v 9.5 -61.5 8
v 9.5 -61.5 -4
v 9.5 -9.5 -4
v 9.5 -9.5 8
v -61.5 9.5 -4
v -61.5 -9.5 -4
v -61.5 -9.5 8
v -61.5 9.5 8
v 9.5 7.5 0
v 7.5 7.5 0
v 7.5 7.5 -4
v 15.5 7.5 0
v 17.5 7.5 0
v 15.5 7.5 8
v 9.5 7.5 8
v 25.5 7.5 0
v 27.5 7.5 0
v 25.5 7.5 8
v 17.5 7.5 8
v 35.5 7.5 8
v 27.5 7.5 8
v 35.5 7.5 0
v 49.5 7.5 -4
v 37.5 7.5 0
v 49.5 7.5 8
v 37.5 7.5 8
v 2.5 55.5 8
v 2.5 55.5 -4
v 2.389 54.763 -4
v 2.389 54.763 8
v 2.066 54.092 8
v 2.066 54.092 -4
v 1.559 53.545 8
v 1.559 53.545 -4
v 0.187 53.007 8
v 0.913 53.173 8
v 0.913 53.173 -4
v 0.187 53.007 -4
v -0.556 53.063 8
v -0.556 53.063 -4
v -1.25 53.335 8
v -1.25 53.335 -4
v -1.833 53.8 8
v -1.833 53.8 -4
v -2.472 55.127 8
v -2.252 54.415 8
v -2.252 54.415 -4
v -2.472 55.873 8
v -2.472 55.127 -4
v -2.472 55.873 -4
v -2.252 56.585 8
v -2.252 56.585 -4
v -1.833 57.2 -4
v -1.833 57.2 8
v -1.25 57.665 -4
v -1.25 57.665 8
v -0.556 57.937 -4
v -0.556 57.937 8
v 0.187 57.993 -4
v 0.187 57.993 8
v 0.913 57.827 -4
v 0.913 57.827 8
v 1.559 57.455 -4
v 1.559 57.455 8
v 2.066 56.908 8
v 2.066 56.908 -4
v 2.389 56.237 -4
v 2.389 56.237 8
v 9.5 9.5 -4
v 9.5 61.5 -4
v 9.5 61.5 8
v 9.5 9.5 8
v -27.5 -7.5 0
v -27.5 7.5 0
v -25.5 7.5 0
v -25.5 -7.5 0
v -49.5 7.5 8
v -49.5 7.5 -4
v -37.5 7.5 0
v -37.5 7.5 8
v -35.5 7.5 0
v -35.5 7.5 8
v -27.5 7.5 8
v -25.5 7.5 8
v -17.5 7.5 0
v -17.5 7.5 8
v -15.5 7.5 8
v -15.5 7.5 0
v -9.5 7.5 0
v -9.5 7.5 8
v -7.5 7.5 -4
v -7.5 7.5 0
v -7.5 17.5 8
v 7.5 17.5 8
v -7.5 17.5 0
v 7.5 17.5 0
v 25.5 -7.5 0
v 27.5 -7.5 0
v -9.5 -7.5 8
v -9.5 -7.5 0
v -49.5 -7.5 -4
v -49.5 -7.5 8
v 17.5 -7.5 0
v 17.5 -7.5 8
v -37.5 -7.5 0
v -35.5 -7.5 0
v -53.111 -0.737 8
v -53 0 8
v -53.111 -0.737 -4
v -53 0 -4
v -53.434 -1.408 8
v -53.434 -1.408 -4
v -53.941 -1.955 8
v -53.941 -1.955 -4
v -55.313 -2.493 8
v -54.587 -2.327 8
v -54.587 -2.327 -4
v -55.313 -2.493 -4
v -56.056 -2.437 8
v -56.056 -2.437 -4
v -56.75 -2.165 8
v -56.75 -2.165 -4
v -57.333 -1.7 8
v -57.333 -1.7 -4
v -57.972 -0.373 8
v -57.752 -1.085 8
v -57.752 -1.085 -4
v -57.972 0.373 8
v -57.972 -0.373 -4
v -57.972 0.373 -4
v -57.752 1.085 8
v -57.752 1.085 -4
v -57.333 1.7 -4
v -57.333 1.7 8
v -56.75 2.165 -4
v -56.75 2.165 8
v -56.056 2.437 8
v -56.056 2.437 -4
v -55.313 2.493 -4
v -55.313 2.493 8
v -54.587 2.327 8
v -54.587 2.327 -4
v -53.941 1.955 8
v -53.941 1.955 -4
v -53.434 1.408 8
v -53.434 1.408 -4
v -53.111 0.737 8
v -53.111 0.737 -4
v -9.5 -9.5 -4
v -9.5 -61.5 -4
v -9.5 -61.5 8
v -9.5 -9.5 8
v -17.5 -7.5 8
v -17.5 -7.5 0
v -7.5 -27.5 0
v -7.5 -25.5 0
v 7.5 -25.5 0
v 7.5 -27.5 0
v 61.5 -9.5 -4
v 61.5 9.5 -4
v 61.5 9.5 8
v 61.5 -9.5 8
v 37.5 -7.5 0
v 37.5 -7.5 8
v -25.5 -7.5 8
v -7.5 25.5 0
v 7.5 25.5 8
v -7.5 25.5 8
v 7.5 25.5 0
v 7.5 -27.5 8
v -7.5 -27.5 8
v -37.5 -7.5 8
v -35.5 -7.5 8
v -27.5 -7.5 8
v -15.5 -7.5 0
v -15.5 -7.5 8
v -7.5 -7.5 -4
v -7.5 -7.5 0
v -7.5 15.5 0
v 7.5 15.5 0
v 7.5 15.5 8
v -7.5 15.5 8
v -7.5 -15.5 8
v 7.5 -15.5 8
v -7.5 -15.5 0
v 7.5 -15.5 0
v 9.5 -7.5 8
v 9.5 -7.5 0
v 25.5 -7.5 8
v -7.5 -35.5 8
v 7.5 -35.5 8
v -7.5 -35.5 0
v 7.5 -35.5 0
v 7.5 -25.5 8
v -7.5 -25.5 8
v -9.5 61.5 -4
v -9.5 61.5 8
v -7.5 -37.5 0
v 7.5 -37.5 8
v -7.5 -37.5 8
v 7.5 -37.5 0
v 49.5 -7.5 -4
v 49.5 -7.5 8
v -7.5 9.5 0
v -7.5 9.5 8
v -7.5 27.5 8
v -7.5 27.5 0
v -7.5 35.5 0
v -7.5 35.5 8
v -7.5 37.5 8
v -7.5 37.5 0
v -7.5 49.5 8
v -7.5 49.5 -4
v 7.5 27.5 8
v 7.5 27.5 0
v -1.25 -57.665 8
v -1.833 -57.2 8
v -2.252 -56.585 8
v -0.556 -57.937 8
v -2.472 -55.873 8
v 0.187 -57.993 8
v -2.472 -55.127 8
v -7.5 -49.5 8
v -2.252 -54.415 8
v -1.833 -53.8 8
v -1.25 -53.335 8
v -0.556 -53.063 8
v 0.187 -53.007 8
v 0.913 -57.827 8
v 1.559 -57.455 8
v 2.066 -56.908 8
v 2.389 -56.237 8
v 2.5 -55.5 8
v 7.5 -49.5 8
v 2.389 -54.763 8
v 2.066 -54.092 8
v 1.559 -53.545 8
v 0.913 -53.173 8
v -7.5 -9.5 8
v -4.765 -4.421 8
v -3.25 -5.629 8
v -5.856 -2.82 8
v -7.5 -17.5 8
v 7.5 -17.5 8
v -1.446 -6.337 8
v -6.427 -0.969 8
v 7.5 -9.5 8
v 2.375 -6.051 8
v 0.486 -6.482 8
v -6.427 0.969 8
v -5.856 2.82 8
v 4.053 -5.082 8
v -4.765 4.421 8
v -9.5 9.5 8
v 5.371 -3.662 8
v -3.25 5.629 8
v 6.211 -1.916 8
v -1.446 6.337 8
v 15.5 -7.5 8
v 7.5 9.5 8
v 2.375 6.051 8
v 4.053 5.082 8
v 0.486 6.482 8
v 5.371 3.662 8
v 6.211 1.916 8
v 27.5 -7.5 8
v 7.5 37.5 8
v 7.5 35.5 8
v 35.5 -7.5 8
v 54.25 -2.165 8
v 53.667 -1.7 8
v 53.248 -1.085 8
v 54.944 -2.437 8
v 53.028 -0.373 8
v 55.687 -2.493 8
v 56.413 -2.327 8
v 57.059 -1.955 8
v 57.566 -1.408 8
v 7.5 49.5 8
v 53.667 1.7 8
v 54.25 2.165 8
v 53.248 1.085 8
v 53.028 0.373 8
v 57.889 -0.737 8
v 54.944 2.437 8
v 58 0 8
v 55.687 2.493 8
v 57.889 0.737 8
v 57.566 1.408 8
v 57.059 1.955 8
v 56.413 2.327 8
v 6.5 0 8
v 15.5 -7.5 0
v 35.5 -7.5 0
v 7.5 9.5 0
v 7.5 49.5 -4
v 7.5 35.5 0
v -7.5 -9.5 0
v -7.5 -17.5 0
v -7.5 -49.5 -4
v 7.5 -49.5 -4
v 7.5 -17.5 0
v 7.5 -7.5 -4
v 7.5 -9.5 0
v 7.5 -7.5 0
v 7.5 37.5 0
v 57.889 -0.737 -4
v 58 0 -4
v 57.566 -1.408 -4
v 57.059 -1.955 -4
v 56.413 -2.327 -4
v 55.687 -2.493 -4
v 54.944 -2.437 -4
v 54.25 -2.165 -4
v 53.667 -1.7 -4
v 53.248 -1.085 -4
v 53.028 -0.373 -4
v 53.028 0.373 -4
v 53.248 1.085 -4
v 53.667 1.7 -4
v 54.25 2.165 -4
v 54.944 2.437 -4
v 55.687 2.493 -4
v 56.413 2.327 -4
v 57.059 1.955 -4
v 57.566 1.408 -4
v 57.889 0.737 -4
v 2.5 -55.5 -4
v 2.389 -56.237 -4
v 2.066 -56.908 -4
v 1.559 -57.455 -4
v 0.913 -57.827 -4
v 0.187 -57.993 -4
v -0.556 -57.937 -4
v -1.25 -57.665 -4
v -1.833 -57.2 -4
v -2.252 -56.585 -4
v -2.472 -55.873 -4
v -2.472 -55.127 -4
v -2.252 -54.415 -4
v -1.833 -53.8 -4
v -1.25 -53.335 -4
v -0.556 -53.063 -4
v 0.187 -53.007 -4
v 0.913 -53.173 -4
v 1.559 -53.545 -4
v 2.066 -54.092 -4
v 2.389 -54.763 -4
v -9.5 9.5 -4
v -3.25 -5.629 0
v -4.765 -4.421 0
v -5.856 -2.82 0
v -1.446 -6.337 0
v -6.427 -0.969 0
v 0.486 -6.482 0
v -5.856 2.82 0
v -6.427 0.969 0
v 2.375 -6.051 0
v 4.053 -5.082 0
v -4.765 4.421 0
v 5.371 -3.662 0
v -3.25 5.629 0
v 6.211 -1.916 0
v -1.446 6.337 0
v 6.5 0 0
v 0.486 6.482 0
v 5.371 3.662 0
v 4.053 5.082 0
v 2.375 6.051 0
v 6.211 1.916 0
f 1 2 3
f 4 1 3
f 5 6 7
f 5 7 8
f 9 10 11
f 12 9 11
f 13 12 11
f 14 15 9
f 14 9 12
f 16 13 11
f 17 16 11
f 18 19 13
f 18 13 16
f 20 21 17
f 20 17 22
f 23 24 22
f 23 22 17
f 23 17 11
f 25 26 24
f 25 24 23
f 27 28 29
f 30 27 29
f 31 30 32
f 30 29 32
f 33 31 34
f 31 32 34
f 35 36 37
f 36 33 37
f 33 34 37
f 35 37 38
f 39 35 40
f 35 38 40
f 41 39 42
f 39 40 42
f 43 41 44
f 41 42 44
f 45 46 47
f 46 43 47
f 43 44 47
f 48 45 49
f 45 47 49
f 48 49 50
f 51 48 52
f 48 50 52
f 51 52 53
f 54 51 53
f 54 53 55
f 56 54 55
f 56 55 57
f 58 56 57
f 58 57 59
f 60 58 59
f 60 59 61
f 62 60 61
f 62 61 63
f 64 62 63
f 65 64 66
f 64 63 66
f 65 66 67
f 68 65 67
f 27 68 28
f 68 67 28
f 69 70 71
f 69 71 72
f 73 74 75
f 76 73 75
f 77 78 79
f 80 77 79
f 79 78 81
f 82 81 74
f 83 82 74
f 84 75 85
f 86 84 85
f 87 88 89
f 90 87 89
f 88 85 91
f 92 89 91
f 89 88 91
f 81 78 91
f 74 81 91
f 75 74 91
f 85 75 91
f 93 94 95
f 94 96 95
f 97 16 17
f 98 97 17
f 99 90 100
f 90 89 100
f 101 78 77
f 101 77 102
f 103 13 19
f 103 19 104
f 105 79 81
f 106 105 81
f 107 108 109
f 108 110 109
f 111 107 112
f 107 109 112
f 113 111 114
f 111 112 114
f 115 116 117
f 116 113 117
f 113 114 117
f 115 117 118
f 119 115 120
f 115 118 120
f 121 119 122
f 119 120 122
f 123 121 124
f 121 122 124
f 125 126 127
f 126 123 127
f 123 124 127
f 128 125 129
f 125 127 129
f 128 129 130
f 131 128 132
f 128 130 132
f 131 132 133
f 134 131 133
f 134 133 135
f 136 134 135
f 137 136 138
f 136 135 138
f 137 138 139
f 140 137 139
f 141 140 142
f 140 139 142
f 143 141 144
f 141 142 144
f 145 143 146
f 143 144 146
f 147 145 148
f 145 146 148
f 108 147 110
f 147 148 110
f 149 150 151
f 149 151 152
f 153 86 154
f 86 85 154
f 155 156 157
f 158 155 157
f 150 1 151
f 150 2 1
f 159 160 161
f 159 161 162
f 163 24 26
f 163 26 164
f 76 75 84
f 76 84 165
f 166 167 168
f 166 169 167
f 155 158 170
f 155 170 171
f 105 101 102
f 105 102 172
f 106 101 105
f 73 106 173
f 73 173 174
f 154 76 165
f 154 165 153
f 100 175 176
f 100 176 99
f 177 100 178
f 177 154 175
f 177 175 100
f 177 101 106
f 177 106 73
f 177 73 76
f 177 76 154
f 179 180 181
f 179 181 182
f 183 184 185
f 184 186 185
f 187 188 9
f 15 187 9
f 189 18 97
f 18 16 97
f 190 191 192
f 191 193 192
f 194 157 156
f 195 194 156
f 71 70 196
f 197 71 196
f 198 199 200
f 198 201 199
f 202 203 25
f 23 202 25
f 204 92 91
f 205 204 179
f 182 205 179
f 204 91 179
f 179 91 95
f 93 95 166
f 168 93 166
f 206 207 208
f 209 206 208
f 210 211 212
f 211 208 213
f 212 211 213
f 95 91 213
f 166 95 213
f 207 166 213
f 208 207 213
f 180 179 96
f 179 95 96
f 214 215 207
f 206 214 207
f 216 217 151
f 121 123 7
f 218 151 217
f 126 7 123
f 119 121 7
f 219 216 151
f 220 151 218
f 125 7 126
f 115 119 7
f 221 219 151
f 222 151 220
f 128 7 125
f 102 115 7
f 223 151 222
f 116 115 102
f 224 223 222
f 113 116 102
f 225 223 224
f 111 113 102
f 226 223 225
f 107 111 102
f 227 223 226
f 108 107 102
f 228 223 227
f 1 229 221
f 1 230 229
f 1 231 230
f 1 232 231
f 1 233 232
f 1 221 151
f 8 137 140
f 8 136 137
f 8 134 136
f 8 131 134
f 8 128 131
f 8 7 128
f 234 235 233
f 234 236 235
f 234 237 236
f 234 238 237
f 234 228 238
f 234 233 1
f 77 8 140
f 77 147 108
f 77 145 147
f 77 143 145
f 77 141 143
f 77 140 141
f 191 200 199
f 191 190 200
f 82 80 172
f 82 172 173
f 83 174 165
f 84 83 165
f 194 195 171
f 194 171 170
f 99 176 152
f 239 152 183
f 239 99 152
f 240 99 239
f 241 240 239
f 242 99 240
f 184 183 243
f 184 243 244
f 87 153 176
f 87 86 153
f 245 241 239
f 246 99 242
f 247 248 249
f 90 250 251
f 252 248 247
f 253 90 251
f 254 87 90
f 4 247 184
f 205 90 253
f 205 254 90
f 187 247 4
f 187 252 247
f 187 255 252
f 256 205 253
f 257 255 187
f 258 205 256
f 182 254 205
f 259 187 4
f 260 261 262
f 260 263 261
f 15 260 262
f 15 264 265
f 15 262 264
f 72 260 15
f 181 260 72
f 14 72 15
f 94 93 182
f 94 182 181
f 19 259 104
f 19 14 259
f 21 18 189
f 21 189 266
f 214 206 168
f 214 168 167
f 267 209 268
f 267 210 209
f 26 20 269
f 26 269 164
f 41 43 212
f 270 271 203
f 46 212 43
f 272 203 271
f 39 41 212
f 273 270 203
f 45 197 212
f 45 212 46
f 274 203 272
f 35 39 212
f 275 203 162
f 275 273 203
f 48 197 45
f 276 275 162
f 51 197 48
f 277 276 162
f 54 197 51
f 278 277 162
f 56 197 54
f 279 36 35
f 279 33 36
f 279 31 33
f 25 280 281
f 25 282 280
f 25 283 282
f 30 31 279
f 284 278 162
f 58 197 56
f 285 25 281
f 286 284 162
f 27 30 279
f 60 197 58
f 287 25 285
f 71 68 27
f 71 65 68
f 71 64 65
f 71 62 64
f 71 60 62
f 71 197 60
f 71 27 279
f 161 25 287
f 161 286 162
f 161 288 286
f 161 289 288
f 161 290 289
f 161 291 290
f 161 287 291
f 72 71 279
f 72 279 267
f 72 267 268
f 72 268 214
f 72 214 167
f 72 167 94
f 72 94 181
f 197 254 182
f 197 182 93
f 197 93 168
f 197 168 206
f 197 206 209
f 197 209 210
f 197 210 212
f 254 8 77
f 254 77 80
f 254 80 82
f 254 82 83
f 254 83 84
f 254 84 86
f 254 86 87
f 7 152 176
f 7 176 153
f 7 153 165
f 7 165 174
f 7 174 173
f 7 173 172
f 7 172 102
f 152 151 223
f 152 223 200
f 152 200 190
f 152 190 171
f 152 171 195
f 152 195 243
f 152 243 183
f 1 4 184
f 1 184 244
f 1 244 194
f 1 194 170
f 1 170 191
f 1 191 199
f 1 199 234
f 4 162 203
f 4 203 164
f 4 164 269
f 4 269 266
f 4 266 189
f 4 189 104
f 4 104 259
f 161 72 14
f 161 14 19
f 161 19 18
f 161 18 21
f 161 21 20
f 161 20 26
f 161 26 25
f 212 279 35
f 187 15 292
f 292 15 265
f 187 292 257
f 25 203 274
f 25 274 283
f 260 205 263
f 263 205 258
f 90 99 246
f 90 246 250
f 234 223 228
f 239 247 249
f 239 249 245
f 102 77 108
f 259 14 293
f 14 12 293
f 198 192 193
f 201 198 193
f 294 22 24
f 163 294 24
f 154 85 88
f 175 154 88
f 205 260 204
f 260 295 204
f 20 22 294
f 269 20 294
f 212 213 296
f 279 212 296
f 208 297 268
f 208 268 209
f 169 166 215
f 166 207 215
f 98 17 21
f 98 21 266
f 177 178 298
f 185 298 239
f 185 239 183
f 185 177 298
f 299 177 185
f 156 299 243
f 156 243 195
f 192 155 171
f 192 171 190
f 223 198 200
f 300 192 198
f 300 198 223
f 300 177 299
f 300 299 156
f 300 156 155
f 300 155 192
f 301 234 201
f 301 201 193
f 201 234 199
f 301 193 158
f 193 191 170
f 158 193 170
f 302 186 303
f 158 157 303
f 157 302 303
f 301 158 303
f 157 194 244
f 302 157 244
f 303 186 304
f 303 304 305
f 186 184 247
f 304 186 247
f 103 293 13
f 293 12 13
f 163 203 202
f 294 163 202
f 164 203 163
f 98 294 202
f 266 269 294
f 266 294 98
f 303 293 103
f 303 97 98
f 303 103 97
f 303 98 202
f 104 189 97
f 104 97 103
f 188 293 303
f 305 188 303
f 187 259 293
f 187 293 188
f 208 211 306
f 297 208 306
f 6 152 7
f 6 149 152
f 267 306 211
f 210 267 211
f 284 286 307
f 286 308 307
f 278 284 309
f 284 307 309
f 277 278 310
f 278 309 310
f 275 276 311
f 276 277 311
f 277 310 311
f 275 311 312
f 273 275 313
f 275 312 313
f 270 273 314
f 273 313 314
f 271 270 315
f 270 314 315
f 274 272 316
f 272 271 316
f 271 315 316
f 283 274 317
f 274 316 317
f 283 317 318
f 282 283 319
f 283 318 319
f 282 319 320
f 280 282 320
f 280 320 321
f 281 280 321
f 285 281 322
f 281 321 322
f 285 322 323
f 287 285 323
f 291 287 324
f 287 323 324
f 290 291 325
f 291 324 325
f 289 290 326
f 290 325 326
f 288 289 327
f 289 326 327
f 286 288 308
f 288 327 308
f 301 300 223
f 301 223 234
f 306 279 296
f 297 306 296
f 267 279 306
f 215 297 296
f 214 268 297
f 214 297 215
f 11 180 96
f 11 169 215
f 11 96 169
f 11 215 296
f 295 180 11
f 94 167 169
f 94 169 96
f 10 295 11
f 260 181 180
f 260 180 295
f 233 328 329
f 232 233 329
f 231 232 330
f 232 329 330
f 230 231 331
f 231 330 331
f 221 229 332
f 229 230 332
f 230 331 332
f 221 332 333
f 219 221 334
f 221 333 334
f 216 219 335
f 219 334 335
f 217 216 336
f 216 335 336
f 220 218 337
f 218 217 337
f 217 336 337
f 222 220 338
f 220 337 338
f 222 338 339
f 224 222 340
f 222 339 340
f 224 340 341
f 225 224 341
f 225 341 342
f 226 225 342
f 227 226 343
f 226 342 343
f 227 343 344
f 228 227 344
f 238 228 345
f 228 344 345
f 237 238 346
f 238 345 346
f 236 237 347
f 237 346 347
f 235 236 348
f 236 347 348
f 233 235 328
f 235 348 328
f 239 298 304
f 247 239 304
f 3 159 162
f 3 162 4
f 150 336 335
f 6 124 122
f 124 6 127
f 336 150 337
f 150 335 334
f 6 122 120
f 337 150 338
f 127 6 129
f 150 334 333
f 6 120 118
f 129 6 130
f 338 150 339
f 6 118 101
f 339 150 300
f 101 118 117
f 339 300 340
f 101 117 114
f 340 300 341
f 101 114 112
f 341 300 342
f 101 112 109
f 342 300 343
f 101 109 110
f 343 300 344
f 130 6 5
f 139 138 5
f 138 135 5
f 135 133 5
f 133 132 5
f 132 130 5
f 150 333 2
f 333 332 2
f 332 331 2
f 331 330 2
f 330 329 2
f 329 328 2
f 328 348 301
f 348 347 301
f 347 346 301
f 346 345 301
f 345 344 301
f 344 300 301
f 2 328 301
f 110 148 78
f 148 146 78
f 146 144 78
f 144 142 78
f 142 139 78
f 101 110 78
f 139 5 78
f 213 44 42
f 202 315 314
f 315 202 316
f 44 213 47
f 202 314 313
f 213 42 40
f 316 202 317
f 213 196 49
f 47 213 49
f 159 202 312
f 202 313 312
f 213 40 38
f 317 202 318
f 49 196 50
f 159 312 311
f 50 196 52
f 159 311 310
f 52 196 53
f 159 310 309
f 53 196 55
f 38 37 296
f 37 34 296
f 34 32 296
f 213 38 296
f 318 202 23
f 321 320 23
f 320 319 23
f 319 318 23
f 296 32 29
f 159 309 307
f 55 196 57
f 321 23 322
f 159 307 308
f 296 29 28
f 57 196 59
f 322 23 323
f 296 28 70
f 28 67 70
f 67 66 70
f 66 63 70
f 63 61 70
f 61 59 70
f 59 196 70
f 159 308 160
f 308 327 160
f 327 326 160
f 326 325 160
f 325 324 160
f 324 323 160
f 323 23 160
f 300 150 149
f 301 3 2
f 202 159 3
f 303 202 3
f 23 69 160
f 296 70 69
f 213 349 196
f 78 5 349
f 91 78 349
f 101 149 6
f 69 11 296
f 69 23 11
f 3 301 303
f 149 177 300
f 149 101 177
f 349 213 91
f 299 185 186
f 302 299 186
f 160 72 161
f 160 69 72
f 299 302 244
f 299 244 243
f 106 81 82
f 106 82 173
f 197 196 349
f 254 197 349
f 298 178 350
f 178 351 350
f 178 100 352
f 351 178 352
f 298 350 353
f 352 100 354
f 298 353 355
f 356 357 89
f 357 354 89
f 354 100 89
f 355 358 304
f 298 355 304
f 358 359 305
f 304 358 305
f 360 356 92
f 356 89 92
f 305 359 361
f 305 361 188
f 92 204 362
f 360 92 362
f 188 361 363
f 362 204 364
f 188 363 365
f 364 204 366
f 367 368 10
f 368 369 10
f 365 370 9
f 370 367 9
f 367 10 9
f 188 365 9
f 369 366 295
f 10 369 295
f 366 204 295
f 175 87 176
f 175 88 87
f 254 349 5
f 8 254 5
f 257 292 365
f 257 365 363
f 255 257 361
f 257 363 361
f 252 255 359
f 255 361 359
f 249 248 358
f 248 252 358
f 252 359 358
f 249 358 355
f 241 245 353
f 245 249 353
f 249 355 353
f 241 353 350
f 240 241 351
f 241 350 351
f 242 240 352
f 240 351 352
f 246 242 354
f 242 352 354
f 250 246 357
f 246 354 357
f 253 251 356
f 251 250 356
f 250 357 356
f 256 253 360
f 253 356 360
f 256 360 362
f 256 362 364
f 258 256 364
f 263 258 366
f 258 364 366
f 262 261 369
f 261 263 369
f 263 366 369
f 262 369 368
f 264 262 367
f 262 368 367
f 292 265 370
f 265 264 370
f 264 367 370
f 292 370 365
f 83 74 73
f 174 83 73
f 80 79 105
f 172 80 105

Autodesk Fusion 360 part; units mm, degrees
sketch "Esboço1" plane through (0, 0, 0) normal (0, 0, 1) x (1, 0, 0)
  line L0 (9.5, 9.5) -> (-9.5, 9.5)
  line L1 (-9.5, 9.5) -> (-9.5, -9.5)
  line L2 (-9.5, -9.5) -> (9.5, -9.5)
  line L3 (9.5, -9.5) -> (9.5, 9.5)
  line L4 (9.5, 9.5) -> (-9.5, -9.5) construction
  line L5 (-9.5, 9.5) -> (9.5, -9.5) construction
  circle A0 centre (0, 0) radius 6.5
  line L6 (-9.5, 9.5) -> (-7.5, 9.5)
  line L7 (-7.5, 9.5) -> (-7.5, 7.5)
  line L8 (-7.5, 7.5) -> (-9.5, 7.5)
  line L9 (-9.5, 7.5) -> (-9.5, 9.5)
  line L10 (9.5, 9.5) -> (7.5, 9.5)
  line L11 (7.5, 9.5) -> (7.5, 7.5)
  line L12 (7.5, 7.5) -> (9.5, 7.5)
  line L13 (9.5, 7.5) -> (9.5, 9.5)
  line L14 (-9.5, -9.5) -> (-7.5, -9.5)
  line L15 (-7.5, -9.5) -> (-7.5, -7.5)
  line L16 (-7.5, -7.5) -> (-9.5, -7.5)
  line L17 (-9.5, -7.5) -> (-9.5, -9.5)
  line L18 (9.5, -9.5) -> (7.5, -9.5)
  line L19 (7.5, -9.5) -> (7.5, -7.5)
  line L20 (7.5, -7.5) -> (9.5, -7.5)
  line L21 (9.5, -7.5) -> (9.5, -9.5)
  line L22 (-9.5, 9.5) -> (-7.5, 9.5)
  line L23 (-7.5, 9.5) -> (-7.5, 49.5)
  line L24 (-7.5, 49.5) -> (-9.5, 49.5)
  line L25 (-9.5, 49.5) -> (-9.5, 9.5)
  line L26 (9.5, 9.5) -> (7.5, 9.5)
  line L27 (7.5, 9.5) -> (7.5, 49.5)
  line L28 (7.5, 49.5) -> (9.5, 49.5)
  line L29 (9.5, 49.5) -> (9.5, 9.5)
  line L30 (-9.5, 49.5) -> (9.5, 49.5)
  line L31 (9.5, 49.5) -> (9.5, 61.5)
  line L32 (9.5, 61.5) -> (-9.5, 61.5)
  line L33 (-9.5, 61.5) -> (-9.5, 49.5)
  line L34 (-9.5, 61.5) -> (9.5, 49.5) construction
  circle A1 centre (0, 55.5) radius 2.5
  line L35 (-7.5, 9.5) -> (7.5, 9.5)
  line L36 (7.5, 9.5) -> (7.5, 15.5)
  line L37 (7.5, 15.5) -> (-7.5, 15.5)
  line L38 (-7.5, 15.5) -> (-7.5, 9.5)
  line L39 (-7.5, 15.5) -> (7.5, 15.5)
  line L40 (7.5, 15.5) -> (7.5, 17.5)
  line L41 (7.5, 17.5) -> (-7.5, 17.5)
  line L42 (-7.5, 17.5) -> (-7.5, 15.5)
  line L43 (-7.5, 17.5) -> (7.5, 17.5)
  line L44 (7.5, 17.5) -> (7.5, 25.5)
  line L45 (7.5, 25.5) -> (-7.5, 25.5)
  line L46 (-7.5, 25.5) -> (-7.5, 17.5)
  line L47 (-7.5, 25.5) -> (7.5, 25.5)
  line L48 (7.5, 25.5) -> (7.5, 27.5)
  line L49 (7.5, 27.5) -> (-7.5, 27.5)
  line L50 (-7.5, 27.5) -> (-7.5, 25.5)
  line L51 (-7.5, 27.5) -> (7.5, 27.5)
  line L52 (7.5, 27.5) -> (7.5, 35.5)
  line L53 (7.5, 35.5) -> (-7.5, 35.5)
  line L54 (-7.5, 35.5) -> (-7.5, 27.5)
  line L55 (-7.5, 35.5) -> (7.5, 35.5)
  line L56 (7.5, 35.5) -> (7.5, 37.5)
  line L57 (7.5, 37.5) -> (-7.5, 37.5)
  line L58 (-7.5, 37.5) -> (-7.5, 35.5)
  line L59 (9.5, 9.5) -> (49.5, 9.5)
  line L60 (49.5, 9.5) -> (49.5, 7.5)
  line L61 (49.5, 7.5) -> (9.5, 7.5)
  line L62 (9.5, 7.5) -> (9.5, 9.5)
  line L63 (9.5, -9.5) -> (49.5, -9.5)
  line L64 (49.5, -9.5) -> (49.5, -7.5)
  line L65 (49.5, -7.5) -> (9.5, -7.5)
  line L66 (9.5, -7.5) -> (9.5, -9.5)
  line L67 (49.5, 9.5) -> (61.5, 9.5)
  line L68 (61.5, 9.5) -> (61.5, -9.5)
  line L69 (61.5, -9.5) -> (49.5, -9.5)
  line L70 (49.5, -9.5) -> (49.5, 9.5)
  line L71 (49.5, 9.5) -> (61.5, -9.5) construction
  circle A2 centre (55.5, 0) radius 2.5
  line L72 (9.5, 7.5) -> (15.5, 7.5)
  line L73 (15.5, 7.5) -> (15.5, -7.5)
  line L74 (15.5, -7.5) -> (9.5, -7.5)
  line L75 (9.5, -7.5) -> (9.5, 7.5)
  line L76 (15.5, 7.5) -> (17.5, 7.5)
  line L77 (17.5, 7.5) -> (17.5, -7.5)
  line L78 (17.5, -7.5) -> (15.5, -7.5)
  line L79 (15.5, -7.5) -> (15.5, 7.5)
  line L80 (17.5, 7.5) -> (25.5, 7.5)
  line L81 (25.5, 7.5) -> (25.5, -7.5)
  line L82 (25.5, -7.5) -> (17.5, -7.5)
  line L83 (17.5, -7.5) -> (17.5, 7.5)
  line L84 (25.5, 7.5) -> (27.5, 7.5)
  line L85 (27.5, 7.5) -> (27.5, -7.5)
  line L86 (27.5, -7.5) -> (25.5, -7.5)
  line L87 (25.5, -7.5) -> (25.5, 7.5)
  line L88 (27.5, 7.5) -> (35.5, 7.5)
  line L89 (35.5, 7.5) -> (35.5, -7.5)
  line L90 (35.5, -7.5) -> (27.5, -7.5)
  line L91 (27.5, -7.5) -> (27.5, 7.5)
  line L92 (35.5, 7.5) -> (37.5, 7.5)
  line L93 (37.5, 7.5) -> (37.5, -7.5)
  line L94 (37.5, -7.5) -> (35.5, -7.5)
  line L95 (35.5, -7.5) -> (35.5, 7.5)
  line L96 (-9.5, -9.5) -> (-7.5, -9.5)
  line L97 (-7.5, -9.5) -> (-7.5, -49.5)
  line L98 (-7.5, -49.5) -> (-9.5, -49.5)
  line L99 (-9.5, -49.5) -> (-9.5, -9.5)
  line L100 (9.5, -9.5) -> (7.5, -9.5)
  line L101 (7.5, -9.5) -> (7.5, -49.5)
  line L102 (7.5, -49.5) -> (9.5, -49.5)
  line L103 (9.5, -49.5) -> (9.5, -9.5)
  line L104 (-9.5, -49.5) -> (9.5, -49.5)
  line L105 (9.5, -49.5) -> (9.5, -61.5)
  line L106 (9.5, -61.5) -> (-9.5, -61.5)
  line L107 (-9.5, -61.5) -> (-9.5, -49.5)
  line L108 (-9.5, -49.5) -> (9.5, -61.5) construction
  circle A3 centre (0, -55.5) radius 2.5
  line L109 (-9.5, -9.5) -> (9.5, -9.5)
  line L110 (9.5, -9.5) -> (9.5, -15.5)
  line L111 (9.5, -15.5) -> (-9.5, -15.5)
  line L112 (-9.5, -15.5) -> (-9.5, -9.5)
  line L113 (-9.5, -15.5) -> (9.5, -15.5)
  line L114 (9.5, -15.5) -> (9.5, -17.5)
  line L115 (9.5, -17.5) -> (-9.5, -17.5)
  line L116 (-9.5, -17.5) -> (-9.5, -15.5)
  line L117 (-9.5, -17.5) -> (9.5, -17.5)
  line L118 (9.5, -17.5) -> (9.5, -25.5)
  line L119 (9.5, -25.5) -> (-9.5, -25.5)
  line L120 (-9.5, -25.5) -> (-9.5, -17.5)
  line L121 (-9.5, -25.5) -> (9.5, -25.5)
  line L122 (9.5, -25.5) -> (9.5, -27.5)
  line L123 (9.5, -27.5) -> (-9.5, -27.5)
  line L124 (-9.5, -27.5) -> (-9.5, -25.5)
  line L125 (-9.5, -27.5) -> (9.5, -27.5)
  line L126 (9.5, -27.5) -> (9.5, -35.5)
  line L127 (9.5, -35.5) -> (-9.5, -35.5)
  line L128 (-9.5, -35.5) -> (-9.5, -27.5)
  line L129 (-9.5, -35.5) -> (9.5, -35.5)
  line L130 (9.5, -35.5) -> (9.5, -37.5)
  line L131 (9.5, -37.5) -> (-9.5, -37.5)
  line L132 (-9.5, -37.5) -> (-9.5, -35.5)
  line L133 (-9.5, 9.5) -> (-49.5, 9.5)
  line L134 (-49.5, 9.5) -> (-49.5, 7.5)
  line L135 (-49.5, 7.5) -> (-9.5, 7.5)
  line L136 (-9.5, 7.5) -> (-9.5, 9.5)
  line L137 (-9.5, -9.5) -> (-49.5, -9.5)
  line L138 (-49.5, -9.5) -> (-49.5, -7.5)
  line L139 (-49.5, -7.5) -> (-9.5, -7.5)
  line L140 (-9.5, -7.5) -> (-9.5, -9.5)
  line L141 (-49.5, -9.5) -> (-61.5, -9.5)
  line L142 (-61.5, -9.5) -> (-61.5, 9.5)
  line L143 (-61.5, 9.5) -> (-49.5, 9.5)
  line L144 (-49.5, 9.5) -> (-49.5, -9.5)
  line L145 (-61.5, 9.5) -> (-49.5, -9.5) construction
  circle A4 centre (-55.5, 0) radius 2.5
  line L146 (-9.5, 9.5) -> (-15.5, 9.5)
  line L147 (-15.5, 9.5) -> (-15.5, -9.5)
  line L148 (-15.5, -9.5) -> (-9.5, -9.5)
  line L149 (-9.5, -9.5) -> (-9.5, 9.5)
  line L150 (-15.5, 9.5) -> (-17.5, 9.5)
  line L151 (-17.5, 9.5) -> (-17.5, -9.5)
  line L152 (-17.5, -9.5) -> (-15.5, -9.5)
  line L153 (-15.5, -9.5) -> (-15.5, 9.5)
  line L154 (-17.5, 9.5) -> (-25.5, 9.5)
  line L155 (-25.5, 9.5) -> (-25.5, -9.5)
  line L156 (-25.5, -9.5) -> (-17.5, -9.5)
  line L157 (-17.5, -9.5) -> (-17.5, 9.5)
  line L158 (-25.5, 9.5) -> (-27.5, 9.5)
  line L159 (-27.5, 9.5) -> (-27.5, -9.5)
  line L160 (-27.5, -9.5) -> (-25.5, -9.5)
  line L161 (-25.5, -9.5) -> (-25.5, 9.5)
  line L162 (-27.5, 9.5) -> (-35.5, 9.5)
  line L163 (-35.5, 9.5) -> (-35.5, -9.5)
  line L164 (-35.5, -9.5) -> (-27.5, -9.5)
  line L165 (-27.5, -9.5) -> (-27.5, 9.5)
  line L166 (-35.5, 9.5) -> (-37.5, 9.5)
  line L167 (-37.5, 9.5) -> (-37.5, -9.5)
  line L168 (-37.5, -9.5) -> (-35.5, -9.5)
  line L169 (-35.5, -9.5) -> (-35.5, 9.5)
  dimension "d1" = 19
  dimension "d2" = 19
  dimension "d3" = 13
  dimension "d4" = 2
  dimension "d5" = 2
  dimension "d6" = 2
  dimension "d7" = 2
  dimension "d8" = 2
  dimension "d9" = 2
  dimension "d10" = 2
  dimension "d11" = 2
  dimension "d13" = 2
  dimension "d14" = 40
  dimension "d15" = 2
  dimension "d16" = 40
  dimension "d17" = 19
  dimension "d18" = 12
  dimension "d19" = 5
  dimension "d20" = 15
  dimension "d21" = 6
  dimension "d22" = 2
  dimension "d23" = 8
  dimension "d24" = 2
  dimension "d25" = 8
  dimension "d26" = 2
  dimension "d27" = 40
  dimension "d28" = 2
  dimension "d29" = 40
  dimension "d30" = 2
  dimension "d31" = 12
  dimension "d32" = 19
  dimension "d33" = 5
  dimension "d34" = 6
  dimension "d35" = 2
  dimension "d36" = 8
  dimension "d37" = 15
  dimension "d38" = 2
  dimension "d39" = 8
  dimension "d40" = 2
  dimension "d41" = 40
  dimension "d42" = 2
  dimension "d43" = 40
  dimension "d44" = 12
  dimension "d45" = 5
  dimension "d46" = 6
  dimension "d47" = 2
  dimension "d48" = 8
  dimension "d49" = 2
  dimension "d50" = 8
  dimension "d51" = 2
  dimension "d52" = 40
  dimension "d53" = 2
  dimension "d54" = 40
  dimension "d55" = 2
  dimension "d56" = 12
  dimension "d57" = 19
  dimension "d58" = 5
  dimension "d59" = 6
  dimension "d60" = 2
  dimension "d61" = 8
  dimension "d62" = 2
  dimension "d63" = 8
  dimension "d64" = 2
extrude "Extrusão1" add sketch "Esboço1" along normal blind 8 contours L0 L3 L10 L11 L12 L13 L26 L62 | L3 L13 L59 L60 L61 L62 L70 L72 L76 L80 L84 L88 L92 | L0 L10 L26 L27 L28 L29 L30 L36 L40 L44 L48 L52 L56 | L0 L1 L2 L3 L7 L8 L11 L12 L15 L16 L19 L20 L35 L75 L109 L149 | L24 L28 L30 L31 L32 L33 | L60 L64 L67 L68 L69 L70 | L0 L1 L6 L7 L8 L9 L22 L136 L149 | L0 L6 L22 L23 L24 L25 L30 L38 L42 L46 L50 L54 L58 | L23 L27 L37 L39 L40 L41 L42 L43 | L3 L21 L63 L64 L65 L66 L70 L74 L78 L82 L86 L90 L94 | L2 L3 L18 L19 L20 L21 L66 L100 L109 | L61 L65 L73 L76 L77 L78 L79 L83 | L1 L9 L133 L135 L136 L146 L147 L149 L153 | L2 L18 L100 L101 L103 L109 L110 L111 L113 | L23 L27 L53 L55 L56 L57 L58 | L61 L65 L89 L92 L93 L94 L95 | L133 L135 L147 L150 L151 L153 L157 | L23 L27 L45 L47 L48 L49 L50 L51 | L101 L103 L111 L113 L114 L115 L117 | L61 L65 L81 L84 L85 L86 L87 L91 | L1 L2 L14 L15 L16 L17 L96 L109 L140 L149 | L1 L17 L137 L139 L140 L147 L148 L149 L153 | L135 L139 L147 L151 L153 L157 | L133 L135 L151 L154 L155 L157 L161 | L2 L14 L96 L97 L99 L109 L111 L112 L113 | L97 L101 L111 L113 L115 L117 | L101 L103 L115 L117 L118 L119 L121 | L137 L139 L147 L151 L152 L153 L157 | L133 L135 L155 L158 L159 L161 L165 | L97 L99 L111 L113 L115 L116 L117 | L101 L103 L119 L121 L122 L123 L125 | L137 L139 L151 L155 L156 L157 L161 | L135 L139 L155 L159 L161 L165 | L133 L135 L159 L162 L163 L165 L169 | L97 L99 L115 L117 L119 L120 L121 | L97 L101 L119 L121 L123 L125 | L101 L103 L123 L125 L126 L127 L129 | L137 L139 L155 L159 L160 L161 L165 | L133 L135 L163 L166 L167 L169 | L97 L99 L119 L121 L123 L124 L125 | L101 L103 L127 L129 L130 L131 | L137 L139 L159 L163 L164 L165 L169 | L135 L139 L163 L167 L169 | L133 L134 L135 L144 L167 | L97 L99 L123 L125 L127 L128 L129 | L97 L101 L127 L129 L131 | L101 L102 L103 L104 L131 | L137 L139 L163 L167 L168 L169 | L134 L138 L141 L142 L143 L144 | L97 L99 L127 L129 L131 L132 | L98 L102 L104 L105 L106 L107 | L137 L138 L139 L144 L167 | L97 L98 L99 L104 L131
extrude "Extrusão2" add sketch "Esboço1" against normal blind 4 contours L0 L3 L10 L11 L12 L13 L26 L62 | L3 L13 L59 L60 L61 L62 L70 L72 L76 L80 L84 L88 L92 | L0 L10 L26 L27 L28 L29 L30 L36 L40 L44 L48 L52 L56 | L24 L28 L30 L31 L32 L33 | L60 L64 L67 L68 L69 L70 | L0 L1 L6 L7 L8 L9 L22 L136 L149 | L0 L6 L22 L23 L24 L25 L30 L38 L42 L46 L50 L54 L58 | L3 L21 L63 L64 L65 L66 L70 L74 L78 L82 L86 L90 L94 | L2 L3 L18 L19 L20 L21 L66 L100 L109 | L1 L9 L133 L135 L136 L146 L147 L149 L153 | L2 L18 L100 L101 L103 L109 L110 L111 L113 | L133 L135 L147 L150 L151 L153 L157 | L101 L103 L111 L113 L114 L115 L117 | L1 L2 L14 L15 L16 L17 L96 L109 L140 L149 | L1 L17 L137 L139 L140 L147 L148 L149 L153 | L133 L135 L151 L154 L155 L157 L161 | L2 L14 L96 L97 L99 L109 L111 L112 L113 | L101 L103 L115 L117 L118 L119 L121 | L137 L139 L147 L151 L152 L153 L157 | L133 L135 L155 L158 L159 L161 L165 | L97 L99 L111 L113 L115 L116 L117 | L101 L103 L119 L121 L122 L123 L125 | L137 L139 L151 L155 L156 L157 L161 | L133 L135 L159 L162 L163 L165 L169 | L97 L99 L115 L117 L119 L120 L121 | L101 L103 L123 L125 L126 L127 L129 | L137 L139 L155 L159 L160 L161 L165 | L133 L135 L163 L166 L167 L169 | L97 L99 L119 L121 L123 L124 L125 | L101 L103 L127 L129 L130 L131 | L137 L139 L159 L163 L164 L165 L169 | L133 L134 L135 L144 L167 | L97 L99 L123 L125 L127 L128 L129 | L101 L102 L103 L104 L131 | L137 L139 L163 L167 L168 L169 | L134 L138 L141 L142 L143 L144 | L97 L99 L127 L129 L131 L132 | L98 L102 L104 L105 L106 L107 | L137 L138 L139 L144 L167 | L97 L98 L99 L104 L131
